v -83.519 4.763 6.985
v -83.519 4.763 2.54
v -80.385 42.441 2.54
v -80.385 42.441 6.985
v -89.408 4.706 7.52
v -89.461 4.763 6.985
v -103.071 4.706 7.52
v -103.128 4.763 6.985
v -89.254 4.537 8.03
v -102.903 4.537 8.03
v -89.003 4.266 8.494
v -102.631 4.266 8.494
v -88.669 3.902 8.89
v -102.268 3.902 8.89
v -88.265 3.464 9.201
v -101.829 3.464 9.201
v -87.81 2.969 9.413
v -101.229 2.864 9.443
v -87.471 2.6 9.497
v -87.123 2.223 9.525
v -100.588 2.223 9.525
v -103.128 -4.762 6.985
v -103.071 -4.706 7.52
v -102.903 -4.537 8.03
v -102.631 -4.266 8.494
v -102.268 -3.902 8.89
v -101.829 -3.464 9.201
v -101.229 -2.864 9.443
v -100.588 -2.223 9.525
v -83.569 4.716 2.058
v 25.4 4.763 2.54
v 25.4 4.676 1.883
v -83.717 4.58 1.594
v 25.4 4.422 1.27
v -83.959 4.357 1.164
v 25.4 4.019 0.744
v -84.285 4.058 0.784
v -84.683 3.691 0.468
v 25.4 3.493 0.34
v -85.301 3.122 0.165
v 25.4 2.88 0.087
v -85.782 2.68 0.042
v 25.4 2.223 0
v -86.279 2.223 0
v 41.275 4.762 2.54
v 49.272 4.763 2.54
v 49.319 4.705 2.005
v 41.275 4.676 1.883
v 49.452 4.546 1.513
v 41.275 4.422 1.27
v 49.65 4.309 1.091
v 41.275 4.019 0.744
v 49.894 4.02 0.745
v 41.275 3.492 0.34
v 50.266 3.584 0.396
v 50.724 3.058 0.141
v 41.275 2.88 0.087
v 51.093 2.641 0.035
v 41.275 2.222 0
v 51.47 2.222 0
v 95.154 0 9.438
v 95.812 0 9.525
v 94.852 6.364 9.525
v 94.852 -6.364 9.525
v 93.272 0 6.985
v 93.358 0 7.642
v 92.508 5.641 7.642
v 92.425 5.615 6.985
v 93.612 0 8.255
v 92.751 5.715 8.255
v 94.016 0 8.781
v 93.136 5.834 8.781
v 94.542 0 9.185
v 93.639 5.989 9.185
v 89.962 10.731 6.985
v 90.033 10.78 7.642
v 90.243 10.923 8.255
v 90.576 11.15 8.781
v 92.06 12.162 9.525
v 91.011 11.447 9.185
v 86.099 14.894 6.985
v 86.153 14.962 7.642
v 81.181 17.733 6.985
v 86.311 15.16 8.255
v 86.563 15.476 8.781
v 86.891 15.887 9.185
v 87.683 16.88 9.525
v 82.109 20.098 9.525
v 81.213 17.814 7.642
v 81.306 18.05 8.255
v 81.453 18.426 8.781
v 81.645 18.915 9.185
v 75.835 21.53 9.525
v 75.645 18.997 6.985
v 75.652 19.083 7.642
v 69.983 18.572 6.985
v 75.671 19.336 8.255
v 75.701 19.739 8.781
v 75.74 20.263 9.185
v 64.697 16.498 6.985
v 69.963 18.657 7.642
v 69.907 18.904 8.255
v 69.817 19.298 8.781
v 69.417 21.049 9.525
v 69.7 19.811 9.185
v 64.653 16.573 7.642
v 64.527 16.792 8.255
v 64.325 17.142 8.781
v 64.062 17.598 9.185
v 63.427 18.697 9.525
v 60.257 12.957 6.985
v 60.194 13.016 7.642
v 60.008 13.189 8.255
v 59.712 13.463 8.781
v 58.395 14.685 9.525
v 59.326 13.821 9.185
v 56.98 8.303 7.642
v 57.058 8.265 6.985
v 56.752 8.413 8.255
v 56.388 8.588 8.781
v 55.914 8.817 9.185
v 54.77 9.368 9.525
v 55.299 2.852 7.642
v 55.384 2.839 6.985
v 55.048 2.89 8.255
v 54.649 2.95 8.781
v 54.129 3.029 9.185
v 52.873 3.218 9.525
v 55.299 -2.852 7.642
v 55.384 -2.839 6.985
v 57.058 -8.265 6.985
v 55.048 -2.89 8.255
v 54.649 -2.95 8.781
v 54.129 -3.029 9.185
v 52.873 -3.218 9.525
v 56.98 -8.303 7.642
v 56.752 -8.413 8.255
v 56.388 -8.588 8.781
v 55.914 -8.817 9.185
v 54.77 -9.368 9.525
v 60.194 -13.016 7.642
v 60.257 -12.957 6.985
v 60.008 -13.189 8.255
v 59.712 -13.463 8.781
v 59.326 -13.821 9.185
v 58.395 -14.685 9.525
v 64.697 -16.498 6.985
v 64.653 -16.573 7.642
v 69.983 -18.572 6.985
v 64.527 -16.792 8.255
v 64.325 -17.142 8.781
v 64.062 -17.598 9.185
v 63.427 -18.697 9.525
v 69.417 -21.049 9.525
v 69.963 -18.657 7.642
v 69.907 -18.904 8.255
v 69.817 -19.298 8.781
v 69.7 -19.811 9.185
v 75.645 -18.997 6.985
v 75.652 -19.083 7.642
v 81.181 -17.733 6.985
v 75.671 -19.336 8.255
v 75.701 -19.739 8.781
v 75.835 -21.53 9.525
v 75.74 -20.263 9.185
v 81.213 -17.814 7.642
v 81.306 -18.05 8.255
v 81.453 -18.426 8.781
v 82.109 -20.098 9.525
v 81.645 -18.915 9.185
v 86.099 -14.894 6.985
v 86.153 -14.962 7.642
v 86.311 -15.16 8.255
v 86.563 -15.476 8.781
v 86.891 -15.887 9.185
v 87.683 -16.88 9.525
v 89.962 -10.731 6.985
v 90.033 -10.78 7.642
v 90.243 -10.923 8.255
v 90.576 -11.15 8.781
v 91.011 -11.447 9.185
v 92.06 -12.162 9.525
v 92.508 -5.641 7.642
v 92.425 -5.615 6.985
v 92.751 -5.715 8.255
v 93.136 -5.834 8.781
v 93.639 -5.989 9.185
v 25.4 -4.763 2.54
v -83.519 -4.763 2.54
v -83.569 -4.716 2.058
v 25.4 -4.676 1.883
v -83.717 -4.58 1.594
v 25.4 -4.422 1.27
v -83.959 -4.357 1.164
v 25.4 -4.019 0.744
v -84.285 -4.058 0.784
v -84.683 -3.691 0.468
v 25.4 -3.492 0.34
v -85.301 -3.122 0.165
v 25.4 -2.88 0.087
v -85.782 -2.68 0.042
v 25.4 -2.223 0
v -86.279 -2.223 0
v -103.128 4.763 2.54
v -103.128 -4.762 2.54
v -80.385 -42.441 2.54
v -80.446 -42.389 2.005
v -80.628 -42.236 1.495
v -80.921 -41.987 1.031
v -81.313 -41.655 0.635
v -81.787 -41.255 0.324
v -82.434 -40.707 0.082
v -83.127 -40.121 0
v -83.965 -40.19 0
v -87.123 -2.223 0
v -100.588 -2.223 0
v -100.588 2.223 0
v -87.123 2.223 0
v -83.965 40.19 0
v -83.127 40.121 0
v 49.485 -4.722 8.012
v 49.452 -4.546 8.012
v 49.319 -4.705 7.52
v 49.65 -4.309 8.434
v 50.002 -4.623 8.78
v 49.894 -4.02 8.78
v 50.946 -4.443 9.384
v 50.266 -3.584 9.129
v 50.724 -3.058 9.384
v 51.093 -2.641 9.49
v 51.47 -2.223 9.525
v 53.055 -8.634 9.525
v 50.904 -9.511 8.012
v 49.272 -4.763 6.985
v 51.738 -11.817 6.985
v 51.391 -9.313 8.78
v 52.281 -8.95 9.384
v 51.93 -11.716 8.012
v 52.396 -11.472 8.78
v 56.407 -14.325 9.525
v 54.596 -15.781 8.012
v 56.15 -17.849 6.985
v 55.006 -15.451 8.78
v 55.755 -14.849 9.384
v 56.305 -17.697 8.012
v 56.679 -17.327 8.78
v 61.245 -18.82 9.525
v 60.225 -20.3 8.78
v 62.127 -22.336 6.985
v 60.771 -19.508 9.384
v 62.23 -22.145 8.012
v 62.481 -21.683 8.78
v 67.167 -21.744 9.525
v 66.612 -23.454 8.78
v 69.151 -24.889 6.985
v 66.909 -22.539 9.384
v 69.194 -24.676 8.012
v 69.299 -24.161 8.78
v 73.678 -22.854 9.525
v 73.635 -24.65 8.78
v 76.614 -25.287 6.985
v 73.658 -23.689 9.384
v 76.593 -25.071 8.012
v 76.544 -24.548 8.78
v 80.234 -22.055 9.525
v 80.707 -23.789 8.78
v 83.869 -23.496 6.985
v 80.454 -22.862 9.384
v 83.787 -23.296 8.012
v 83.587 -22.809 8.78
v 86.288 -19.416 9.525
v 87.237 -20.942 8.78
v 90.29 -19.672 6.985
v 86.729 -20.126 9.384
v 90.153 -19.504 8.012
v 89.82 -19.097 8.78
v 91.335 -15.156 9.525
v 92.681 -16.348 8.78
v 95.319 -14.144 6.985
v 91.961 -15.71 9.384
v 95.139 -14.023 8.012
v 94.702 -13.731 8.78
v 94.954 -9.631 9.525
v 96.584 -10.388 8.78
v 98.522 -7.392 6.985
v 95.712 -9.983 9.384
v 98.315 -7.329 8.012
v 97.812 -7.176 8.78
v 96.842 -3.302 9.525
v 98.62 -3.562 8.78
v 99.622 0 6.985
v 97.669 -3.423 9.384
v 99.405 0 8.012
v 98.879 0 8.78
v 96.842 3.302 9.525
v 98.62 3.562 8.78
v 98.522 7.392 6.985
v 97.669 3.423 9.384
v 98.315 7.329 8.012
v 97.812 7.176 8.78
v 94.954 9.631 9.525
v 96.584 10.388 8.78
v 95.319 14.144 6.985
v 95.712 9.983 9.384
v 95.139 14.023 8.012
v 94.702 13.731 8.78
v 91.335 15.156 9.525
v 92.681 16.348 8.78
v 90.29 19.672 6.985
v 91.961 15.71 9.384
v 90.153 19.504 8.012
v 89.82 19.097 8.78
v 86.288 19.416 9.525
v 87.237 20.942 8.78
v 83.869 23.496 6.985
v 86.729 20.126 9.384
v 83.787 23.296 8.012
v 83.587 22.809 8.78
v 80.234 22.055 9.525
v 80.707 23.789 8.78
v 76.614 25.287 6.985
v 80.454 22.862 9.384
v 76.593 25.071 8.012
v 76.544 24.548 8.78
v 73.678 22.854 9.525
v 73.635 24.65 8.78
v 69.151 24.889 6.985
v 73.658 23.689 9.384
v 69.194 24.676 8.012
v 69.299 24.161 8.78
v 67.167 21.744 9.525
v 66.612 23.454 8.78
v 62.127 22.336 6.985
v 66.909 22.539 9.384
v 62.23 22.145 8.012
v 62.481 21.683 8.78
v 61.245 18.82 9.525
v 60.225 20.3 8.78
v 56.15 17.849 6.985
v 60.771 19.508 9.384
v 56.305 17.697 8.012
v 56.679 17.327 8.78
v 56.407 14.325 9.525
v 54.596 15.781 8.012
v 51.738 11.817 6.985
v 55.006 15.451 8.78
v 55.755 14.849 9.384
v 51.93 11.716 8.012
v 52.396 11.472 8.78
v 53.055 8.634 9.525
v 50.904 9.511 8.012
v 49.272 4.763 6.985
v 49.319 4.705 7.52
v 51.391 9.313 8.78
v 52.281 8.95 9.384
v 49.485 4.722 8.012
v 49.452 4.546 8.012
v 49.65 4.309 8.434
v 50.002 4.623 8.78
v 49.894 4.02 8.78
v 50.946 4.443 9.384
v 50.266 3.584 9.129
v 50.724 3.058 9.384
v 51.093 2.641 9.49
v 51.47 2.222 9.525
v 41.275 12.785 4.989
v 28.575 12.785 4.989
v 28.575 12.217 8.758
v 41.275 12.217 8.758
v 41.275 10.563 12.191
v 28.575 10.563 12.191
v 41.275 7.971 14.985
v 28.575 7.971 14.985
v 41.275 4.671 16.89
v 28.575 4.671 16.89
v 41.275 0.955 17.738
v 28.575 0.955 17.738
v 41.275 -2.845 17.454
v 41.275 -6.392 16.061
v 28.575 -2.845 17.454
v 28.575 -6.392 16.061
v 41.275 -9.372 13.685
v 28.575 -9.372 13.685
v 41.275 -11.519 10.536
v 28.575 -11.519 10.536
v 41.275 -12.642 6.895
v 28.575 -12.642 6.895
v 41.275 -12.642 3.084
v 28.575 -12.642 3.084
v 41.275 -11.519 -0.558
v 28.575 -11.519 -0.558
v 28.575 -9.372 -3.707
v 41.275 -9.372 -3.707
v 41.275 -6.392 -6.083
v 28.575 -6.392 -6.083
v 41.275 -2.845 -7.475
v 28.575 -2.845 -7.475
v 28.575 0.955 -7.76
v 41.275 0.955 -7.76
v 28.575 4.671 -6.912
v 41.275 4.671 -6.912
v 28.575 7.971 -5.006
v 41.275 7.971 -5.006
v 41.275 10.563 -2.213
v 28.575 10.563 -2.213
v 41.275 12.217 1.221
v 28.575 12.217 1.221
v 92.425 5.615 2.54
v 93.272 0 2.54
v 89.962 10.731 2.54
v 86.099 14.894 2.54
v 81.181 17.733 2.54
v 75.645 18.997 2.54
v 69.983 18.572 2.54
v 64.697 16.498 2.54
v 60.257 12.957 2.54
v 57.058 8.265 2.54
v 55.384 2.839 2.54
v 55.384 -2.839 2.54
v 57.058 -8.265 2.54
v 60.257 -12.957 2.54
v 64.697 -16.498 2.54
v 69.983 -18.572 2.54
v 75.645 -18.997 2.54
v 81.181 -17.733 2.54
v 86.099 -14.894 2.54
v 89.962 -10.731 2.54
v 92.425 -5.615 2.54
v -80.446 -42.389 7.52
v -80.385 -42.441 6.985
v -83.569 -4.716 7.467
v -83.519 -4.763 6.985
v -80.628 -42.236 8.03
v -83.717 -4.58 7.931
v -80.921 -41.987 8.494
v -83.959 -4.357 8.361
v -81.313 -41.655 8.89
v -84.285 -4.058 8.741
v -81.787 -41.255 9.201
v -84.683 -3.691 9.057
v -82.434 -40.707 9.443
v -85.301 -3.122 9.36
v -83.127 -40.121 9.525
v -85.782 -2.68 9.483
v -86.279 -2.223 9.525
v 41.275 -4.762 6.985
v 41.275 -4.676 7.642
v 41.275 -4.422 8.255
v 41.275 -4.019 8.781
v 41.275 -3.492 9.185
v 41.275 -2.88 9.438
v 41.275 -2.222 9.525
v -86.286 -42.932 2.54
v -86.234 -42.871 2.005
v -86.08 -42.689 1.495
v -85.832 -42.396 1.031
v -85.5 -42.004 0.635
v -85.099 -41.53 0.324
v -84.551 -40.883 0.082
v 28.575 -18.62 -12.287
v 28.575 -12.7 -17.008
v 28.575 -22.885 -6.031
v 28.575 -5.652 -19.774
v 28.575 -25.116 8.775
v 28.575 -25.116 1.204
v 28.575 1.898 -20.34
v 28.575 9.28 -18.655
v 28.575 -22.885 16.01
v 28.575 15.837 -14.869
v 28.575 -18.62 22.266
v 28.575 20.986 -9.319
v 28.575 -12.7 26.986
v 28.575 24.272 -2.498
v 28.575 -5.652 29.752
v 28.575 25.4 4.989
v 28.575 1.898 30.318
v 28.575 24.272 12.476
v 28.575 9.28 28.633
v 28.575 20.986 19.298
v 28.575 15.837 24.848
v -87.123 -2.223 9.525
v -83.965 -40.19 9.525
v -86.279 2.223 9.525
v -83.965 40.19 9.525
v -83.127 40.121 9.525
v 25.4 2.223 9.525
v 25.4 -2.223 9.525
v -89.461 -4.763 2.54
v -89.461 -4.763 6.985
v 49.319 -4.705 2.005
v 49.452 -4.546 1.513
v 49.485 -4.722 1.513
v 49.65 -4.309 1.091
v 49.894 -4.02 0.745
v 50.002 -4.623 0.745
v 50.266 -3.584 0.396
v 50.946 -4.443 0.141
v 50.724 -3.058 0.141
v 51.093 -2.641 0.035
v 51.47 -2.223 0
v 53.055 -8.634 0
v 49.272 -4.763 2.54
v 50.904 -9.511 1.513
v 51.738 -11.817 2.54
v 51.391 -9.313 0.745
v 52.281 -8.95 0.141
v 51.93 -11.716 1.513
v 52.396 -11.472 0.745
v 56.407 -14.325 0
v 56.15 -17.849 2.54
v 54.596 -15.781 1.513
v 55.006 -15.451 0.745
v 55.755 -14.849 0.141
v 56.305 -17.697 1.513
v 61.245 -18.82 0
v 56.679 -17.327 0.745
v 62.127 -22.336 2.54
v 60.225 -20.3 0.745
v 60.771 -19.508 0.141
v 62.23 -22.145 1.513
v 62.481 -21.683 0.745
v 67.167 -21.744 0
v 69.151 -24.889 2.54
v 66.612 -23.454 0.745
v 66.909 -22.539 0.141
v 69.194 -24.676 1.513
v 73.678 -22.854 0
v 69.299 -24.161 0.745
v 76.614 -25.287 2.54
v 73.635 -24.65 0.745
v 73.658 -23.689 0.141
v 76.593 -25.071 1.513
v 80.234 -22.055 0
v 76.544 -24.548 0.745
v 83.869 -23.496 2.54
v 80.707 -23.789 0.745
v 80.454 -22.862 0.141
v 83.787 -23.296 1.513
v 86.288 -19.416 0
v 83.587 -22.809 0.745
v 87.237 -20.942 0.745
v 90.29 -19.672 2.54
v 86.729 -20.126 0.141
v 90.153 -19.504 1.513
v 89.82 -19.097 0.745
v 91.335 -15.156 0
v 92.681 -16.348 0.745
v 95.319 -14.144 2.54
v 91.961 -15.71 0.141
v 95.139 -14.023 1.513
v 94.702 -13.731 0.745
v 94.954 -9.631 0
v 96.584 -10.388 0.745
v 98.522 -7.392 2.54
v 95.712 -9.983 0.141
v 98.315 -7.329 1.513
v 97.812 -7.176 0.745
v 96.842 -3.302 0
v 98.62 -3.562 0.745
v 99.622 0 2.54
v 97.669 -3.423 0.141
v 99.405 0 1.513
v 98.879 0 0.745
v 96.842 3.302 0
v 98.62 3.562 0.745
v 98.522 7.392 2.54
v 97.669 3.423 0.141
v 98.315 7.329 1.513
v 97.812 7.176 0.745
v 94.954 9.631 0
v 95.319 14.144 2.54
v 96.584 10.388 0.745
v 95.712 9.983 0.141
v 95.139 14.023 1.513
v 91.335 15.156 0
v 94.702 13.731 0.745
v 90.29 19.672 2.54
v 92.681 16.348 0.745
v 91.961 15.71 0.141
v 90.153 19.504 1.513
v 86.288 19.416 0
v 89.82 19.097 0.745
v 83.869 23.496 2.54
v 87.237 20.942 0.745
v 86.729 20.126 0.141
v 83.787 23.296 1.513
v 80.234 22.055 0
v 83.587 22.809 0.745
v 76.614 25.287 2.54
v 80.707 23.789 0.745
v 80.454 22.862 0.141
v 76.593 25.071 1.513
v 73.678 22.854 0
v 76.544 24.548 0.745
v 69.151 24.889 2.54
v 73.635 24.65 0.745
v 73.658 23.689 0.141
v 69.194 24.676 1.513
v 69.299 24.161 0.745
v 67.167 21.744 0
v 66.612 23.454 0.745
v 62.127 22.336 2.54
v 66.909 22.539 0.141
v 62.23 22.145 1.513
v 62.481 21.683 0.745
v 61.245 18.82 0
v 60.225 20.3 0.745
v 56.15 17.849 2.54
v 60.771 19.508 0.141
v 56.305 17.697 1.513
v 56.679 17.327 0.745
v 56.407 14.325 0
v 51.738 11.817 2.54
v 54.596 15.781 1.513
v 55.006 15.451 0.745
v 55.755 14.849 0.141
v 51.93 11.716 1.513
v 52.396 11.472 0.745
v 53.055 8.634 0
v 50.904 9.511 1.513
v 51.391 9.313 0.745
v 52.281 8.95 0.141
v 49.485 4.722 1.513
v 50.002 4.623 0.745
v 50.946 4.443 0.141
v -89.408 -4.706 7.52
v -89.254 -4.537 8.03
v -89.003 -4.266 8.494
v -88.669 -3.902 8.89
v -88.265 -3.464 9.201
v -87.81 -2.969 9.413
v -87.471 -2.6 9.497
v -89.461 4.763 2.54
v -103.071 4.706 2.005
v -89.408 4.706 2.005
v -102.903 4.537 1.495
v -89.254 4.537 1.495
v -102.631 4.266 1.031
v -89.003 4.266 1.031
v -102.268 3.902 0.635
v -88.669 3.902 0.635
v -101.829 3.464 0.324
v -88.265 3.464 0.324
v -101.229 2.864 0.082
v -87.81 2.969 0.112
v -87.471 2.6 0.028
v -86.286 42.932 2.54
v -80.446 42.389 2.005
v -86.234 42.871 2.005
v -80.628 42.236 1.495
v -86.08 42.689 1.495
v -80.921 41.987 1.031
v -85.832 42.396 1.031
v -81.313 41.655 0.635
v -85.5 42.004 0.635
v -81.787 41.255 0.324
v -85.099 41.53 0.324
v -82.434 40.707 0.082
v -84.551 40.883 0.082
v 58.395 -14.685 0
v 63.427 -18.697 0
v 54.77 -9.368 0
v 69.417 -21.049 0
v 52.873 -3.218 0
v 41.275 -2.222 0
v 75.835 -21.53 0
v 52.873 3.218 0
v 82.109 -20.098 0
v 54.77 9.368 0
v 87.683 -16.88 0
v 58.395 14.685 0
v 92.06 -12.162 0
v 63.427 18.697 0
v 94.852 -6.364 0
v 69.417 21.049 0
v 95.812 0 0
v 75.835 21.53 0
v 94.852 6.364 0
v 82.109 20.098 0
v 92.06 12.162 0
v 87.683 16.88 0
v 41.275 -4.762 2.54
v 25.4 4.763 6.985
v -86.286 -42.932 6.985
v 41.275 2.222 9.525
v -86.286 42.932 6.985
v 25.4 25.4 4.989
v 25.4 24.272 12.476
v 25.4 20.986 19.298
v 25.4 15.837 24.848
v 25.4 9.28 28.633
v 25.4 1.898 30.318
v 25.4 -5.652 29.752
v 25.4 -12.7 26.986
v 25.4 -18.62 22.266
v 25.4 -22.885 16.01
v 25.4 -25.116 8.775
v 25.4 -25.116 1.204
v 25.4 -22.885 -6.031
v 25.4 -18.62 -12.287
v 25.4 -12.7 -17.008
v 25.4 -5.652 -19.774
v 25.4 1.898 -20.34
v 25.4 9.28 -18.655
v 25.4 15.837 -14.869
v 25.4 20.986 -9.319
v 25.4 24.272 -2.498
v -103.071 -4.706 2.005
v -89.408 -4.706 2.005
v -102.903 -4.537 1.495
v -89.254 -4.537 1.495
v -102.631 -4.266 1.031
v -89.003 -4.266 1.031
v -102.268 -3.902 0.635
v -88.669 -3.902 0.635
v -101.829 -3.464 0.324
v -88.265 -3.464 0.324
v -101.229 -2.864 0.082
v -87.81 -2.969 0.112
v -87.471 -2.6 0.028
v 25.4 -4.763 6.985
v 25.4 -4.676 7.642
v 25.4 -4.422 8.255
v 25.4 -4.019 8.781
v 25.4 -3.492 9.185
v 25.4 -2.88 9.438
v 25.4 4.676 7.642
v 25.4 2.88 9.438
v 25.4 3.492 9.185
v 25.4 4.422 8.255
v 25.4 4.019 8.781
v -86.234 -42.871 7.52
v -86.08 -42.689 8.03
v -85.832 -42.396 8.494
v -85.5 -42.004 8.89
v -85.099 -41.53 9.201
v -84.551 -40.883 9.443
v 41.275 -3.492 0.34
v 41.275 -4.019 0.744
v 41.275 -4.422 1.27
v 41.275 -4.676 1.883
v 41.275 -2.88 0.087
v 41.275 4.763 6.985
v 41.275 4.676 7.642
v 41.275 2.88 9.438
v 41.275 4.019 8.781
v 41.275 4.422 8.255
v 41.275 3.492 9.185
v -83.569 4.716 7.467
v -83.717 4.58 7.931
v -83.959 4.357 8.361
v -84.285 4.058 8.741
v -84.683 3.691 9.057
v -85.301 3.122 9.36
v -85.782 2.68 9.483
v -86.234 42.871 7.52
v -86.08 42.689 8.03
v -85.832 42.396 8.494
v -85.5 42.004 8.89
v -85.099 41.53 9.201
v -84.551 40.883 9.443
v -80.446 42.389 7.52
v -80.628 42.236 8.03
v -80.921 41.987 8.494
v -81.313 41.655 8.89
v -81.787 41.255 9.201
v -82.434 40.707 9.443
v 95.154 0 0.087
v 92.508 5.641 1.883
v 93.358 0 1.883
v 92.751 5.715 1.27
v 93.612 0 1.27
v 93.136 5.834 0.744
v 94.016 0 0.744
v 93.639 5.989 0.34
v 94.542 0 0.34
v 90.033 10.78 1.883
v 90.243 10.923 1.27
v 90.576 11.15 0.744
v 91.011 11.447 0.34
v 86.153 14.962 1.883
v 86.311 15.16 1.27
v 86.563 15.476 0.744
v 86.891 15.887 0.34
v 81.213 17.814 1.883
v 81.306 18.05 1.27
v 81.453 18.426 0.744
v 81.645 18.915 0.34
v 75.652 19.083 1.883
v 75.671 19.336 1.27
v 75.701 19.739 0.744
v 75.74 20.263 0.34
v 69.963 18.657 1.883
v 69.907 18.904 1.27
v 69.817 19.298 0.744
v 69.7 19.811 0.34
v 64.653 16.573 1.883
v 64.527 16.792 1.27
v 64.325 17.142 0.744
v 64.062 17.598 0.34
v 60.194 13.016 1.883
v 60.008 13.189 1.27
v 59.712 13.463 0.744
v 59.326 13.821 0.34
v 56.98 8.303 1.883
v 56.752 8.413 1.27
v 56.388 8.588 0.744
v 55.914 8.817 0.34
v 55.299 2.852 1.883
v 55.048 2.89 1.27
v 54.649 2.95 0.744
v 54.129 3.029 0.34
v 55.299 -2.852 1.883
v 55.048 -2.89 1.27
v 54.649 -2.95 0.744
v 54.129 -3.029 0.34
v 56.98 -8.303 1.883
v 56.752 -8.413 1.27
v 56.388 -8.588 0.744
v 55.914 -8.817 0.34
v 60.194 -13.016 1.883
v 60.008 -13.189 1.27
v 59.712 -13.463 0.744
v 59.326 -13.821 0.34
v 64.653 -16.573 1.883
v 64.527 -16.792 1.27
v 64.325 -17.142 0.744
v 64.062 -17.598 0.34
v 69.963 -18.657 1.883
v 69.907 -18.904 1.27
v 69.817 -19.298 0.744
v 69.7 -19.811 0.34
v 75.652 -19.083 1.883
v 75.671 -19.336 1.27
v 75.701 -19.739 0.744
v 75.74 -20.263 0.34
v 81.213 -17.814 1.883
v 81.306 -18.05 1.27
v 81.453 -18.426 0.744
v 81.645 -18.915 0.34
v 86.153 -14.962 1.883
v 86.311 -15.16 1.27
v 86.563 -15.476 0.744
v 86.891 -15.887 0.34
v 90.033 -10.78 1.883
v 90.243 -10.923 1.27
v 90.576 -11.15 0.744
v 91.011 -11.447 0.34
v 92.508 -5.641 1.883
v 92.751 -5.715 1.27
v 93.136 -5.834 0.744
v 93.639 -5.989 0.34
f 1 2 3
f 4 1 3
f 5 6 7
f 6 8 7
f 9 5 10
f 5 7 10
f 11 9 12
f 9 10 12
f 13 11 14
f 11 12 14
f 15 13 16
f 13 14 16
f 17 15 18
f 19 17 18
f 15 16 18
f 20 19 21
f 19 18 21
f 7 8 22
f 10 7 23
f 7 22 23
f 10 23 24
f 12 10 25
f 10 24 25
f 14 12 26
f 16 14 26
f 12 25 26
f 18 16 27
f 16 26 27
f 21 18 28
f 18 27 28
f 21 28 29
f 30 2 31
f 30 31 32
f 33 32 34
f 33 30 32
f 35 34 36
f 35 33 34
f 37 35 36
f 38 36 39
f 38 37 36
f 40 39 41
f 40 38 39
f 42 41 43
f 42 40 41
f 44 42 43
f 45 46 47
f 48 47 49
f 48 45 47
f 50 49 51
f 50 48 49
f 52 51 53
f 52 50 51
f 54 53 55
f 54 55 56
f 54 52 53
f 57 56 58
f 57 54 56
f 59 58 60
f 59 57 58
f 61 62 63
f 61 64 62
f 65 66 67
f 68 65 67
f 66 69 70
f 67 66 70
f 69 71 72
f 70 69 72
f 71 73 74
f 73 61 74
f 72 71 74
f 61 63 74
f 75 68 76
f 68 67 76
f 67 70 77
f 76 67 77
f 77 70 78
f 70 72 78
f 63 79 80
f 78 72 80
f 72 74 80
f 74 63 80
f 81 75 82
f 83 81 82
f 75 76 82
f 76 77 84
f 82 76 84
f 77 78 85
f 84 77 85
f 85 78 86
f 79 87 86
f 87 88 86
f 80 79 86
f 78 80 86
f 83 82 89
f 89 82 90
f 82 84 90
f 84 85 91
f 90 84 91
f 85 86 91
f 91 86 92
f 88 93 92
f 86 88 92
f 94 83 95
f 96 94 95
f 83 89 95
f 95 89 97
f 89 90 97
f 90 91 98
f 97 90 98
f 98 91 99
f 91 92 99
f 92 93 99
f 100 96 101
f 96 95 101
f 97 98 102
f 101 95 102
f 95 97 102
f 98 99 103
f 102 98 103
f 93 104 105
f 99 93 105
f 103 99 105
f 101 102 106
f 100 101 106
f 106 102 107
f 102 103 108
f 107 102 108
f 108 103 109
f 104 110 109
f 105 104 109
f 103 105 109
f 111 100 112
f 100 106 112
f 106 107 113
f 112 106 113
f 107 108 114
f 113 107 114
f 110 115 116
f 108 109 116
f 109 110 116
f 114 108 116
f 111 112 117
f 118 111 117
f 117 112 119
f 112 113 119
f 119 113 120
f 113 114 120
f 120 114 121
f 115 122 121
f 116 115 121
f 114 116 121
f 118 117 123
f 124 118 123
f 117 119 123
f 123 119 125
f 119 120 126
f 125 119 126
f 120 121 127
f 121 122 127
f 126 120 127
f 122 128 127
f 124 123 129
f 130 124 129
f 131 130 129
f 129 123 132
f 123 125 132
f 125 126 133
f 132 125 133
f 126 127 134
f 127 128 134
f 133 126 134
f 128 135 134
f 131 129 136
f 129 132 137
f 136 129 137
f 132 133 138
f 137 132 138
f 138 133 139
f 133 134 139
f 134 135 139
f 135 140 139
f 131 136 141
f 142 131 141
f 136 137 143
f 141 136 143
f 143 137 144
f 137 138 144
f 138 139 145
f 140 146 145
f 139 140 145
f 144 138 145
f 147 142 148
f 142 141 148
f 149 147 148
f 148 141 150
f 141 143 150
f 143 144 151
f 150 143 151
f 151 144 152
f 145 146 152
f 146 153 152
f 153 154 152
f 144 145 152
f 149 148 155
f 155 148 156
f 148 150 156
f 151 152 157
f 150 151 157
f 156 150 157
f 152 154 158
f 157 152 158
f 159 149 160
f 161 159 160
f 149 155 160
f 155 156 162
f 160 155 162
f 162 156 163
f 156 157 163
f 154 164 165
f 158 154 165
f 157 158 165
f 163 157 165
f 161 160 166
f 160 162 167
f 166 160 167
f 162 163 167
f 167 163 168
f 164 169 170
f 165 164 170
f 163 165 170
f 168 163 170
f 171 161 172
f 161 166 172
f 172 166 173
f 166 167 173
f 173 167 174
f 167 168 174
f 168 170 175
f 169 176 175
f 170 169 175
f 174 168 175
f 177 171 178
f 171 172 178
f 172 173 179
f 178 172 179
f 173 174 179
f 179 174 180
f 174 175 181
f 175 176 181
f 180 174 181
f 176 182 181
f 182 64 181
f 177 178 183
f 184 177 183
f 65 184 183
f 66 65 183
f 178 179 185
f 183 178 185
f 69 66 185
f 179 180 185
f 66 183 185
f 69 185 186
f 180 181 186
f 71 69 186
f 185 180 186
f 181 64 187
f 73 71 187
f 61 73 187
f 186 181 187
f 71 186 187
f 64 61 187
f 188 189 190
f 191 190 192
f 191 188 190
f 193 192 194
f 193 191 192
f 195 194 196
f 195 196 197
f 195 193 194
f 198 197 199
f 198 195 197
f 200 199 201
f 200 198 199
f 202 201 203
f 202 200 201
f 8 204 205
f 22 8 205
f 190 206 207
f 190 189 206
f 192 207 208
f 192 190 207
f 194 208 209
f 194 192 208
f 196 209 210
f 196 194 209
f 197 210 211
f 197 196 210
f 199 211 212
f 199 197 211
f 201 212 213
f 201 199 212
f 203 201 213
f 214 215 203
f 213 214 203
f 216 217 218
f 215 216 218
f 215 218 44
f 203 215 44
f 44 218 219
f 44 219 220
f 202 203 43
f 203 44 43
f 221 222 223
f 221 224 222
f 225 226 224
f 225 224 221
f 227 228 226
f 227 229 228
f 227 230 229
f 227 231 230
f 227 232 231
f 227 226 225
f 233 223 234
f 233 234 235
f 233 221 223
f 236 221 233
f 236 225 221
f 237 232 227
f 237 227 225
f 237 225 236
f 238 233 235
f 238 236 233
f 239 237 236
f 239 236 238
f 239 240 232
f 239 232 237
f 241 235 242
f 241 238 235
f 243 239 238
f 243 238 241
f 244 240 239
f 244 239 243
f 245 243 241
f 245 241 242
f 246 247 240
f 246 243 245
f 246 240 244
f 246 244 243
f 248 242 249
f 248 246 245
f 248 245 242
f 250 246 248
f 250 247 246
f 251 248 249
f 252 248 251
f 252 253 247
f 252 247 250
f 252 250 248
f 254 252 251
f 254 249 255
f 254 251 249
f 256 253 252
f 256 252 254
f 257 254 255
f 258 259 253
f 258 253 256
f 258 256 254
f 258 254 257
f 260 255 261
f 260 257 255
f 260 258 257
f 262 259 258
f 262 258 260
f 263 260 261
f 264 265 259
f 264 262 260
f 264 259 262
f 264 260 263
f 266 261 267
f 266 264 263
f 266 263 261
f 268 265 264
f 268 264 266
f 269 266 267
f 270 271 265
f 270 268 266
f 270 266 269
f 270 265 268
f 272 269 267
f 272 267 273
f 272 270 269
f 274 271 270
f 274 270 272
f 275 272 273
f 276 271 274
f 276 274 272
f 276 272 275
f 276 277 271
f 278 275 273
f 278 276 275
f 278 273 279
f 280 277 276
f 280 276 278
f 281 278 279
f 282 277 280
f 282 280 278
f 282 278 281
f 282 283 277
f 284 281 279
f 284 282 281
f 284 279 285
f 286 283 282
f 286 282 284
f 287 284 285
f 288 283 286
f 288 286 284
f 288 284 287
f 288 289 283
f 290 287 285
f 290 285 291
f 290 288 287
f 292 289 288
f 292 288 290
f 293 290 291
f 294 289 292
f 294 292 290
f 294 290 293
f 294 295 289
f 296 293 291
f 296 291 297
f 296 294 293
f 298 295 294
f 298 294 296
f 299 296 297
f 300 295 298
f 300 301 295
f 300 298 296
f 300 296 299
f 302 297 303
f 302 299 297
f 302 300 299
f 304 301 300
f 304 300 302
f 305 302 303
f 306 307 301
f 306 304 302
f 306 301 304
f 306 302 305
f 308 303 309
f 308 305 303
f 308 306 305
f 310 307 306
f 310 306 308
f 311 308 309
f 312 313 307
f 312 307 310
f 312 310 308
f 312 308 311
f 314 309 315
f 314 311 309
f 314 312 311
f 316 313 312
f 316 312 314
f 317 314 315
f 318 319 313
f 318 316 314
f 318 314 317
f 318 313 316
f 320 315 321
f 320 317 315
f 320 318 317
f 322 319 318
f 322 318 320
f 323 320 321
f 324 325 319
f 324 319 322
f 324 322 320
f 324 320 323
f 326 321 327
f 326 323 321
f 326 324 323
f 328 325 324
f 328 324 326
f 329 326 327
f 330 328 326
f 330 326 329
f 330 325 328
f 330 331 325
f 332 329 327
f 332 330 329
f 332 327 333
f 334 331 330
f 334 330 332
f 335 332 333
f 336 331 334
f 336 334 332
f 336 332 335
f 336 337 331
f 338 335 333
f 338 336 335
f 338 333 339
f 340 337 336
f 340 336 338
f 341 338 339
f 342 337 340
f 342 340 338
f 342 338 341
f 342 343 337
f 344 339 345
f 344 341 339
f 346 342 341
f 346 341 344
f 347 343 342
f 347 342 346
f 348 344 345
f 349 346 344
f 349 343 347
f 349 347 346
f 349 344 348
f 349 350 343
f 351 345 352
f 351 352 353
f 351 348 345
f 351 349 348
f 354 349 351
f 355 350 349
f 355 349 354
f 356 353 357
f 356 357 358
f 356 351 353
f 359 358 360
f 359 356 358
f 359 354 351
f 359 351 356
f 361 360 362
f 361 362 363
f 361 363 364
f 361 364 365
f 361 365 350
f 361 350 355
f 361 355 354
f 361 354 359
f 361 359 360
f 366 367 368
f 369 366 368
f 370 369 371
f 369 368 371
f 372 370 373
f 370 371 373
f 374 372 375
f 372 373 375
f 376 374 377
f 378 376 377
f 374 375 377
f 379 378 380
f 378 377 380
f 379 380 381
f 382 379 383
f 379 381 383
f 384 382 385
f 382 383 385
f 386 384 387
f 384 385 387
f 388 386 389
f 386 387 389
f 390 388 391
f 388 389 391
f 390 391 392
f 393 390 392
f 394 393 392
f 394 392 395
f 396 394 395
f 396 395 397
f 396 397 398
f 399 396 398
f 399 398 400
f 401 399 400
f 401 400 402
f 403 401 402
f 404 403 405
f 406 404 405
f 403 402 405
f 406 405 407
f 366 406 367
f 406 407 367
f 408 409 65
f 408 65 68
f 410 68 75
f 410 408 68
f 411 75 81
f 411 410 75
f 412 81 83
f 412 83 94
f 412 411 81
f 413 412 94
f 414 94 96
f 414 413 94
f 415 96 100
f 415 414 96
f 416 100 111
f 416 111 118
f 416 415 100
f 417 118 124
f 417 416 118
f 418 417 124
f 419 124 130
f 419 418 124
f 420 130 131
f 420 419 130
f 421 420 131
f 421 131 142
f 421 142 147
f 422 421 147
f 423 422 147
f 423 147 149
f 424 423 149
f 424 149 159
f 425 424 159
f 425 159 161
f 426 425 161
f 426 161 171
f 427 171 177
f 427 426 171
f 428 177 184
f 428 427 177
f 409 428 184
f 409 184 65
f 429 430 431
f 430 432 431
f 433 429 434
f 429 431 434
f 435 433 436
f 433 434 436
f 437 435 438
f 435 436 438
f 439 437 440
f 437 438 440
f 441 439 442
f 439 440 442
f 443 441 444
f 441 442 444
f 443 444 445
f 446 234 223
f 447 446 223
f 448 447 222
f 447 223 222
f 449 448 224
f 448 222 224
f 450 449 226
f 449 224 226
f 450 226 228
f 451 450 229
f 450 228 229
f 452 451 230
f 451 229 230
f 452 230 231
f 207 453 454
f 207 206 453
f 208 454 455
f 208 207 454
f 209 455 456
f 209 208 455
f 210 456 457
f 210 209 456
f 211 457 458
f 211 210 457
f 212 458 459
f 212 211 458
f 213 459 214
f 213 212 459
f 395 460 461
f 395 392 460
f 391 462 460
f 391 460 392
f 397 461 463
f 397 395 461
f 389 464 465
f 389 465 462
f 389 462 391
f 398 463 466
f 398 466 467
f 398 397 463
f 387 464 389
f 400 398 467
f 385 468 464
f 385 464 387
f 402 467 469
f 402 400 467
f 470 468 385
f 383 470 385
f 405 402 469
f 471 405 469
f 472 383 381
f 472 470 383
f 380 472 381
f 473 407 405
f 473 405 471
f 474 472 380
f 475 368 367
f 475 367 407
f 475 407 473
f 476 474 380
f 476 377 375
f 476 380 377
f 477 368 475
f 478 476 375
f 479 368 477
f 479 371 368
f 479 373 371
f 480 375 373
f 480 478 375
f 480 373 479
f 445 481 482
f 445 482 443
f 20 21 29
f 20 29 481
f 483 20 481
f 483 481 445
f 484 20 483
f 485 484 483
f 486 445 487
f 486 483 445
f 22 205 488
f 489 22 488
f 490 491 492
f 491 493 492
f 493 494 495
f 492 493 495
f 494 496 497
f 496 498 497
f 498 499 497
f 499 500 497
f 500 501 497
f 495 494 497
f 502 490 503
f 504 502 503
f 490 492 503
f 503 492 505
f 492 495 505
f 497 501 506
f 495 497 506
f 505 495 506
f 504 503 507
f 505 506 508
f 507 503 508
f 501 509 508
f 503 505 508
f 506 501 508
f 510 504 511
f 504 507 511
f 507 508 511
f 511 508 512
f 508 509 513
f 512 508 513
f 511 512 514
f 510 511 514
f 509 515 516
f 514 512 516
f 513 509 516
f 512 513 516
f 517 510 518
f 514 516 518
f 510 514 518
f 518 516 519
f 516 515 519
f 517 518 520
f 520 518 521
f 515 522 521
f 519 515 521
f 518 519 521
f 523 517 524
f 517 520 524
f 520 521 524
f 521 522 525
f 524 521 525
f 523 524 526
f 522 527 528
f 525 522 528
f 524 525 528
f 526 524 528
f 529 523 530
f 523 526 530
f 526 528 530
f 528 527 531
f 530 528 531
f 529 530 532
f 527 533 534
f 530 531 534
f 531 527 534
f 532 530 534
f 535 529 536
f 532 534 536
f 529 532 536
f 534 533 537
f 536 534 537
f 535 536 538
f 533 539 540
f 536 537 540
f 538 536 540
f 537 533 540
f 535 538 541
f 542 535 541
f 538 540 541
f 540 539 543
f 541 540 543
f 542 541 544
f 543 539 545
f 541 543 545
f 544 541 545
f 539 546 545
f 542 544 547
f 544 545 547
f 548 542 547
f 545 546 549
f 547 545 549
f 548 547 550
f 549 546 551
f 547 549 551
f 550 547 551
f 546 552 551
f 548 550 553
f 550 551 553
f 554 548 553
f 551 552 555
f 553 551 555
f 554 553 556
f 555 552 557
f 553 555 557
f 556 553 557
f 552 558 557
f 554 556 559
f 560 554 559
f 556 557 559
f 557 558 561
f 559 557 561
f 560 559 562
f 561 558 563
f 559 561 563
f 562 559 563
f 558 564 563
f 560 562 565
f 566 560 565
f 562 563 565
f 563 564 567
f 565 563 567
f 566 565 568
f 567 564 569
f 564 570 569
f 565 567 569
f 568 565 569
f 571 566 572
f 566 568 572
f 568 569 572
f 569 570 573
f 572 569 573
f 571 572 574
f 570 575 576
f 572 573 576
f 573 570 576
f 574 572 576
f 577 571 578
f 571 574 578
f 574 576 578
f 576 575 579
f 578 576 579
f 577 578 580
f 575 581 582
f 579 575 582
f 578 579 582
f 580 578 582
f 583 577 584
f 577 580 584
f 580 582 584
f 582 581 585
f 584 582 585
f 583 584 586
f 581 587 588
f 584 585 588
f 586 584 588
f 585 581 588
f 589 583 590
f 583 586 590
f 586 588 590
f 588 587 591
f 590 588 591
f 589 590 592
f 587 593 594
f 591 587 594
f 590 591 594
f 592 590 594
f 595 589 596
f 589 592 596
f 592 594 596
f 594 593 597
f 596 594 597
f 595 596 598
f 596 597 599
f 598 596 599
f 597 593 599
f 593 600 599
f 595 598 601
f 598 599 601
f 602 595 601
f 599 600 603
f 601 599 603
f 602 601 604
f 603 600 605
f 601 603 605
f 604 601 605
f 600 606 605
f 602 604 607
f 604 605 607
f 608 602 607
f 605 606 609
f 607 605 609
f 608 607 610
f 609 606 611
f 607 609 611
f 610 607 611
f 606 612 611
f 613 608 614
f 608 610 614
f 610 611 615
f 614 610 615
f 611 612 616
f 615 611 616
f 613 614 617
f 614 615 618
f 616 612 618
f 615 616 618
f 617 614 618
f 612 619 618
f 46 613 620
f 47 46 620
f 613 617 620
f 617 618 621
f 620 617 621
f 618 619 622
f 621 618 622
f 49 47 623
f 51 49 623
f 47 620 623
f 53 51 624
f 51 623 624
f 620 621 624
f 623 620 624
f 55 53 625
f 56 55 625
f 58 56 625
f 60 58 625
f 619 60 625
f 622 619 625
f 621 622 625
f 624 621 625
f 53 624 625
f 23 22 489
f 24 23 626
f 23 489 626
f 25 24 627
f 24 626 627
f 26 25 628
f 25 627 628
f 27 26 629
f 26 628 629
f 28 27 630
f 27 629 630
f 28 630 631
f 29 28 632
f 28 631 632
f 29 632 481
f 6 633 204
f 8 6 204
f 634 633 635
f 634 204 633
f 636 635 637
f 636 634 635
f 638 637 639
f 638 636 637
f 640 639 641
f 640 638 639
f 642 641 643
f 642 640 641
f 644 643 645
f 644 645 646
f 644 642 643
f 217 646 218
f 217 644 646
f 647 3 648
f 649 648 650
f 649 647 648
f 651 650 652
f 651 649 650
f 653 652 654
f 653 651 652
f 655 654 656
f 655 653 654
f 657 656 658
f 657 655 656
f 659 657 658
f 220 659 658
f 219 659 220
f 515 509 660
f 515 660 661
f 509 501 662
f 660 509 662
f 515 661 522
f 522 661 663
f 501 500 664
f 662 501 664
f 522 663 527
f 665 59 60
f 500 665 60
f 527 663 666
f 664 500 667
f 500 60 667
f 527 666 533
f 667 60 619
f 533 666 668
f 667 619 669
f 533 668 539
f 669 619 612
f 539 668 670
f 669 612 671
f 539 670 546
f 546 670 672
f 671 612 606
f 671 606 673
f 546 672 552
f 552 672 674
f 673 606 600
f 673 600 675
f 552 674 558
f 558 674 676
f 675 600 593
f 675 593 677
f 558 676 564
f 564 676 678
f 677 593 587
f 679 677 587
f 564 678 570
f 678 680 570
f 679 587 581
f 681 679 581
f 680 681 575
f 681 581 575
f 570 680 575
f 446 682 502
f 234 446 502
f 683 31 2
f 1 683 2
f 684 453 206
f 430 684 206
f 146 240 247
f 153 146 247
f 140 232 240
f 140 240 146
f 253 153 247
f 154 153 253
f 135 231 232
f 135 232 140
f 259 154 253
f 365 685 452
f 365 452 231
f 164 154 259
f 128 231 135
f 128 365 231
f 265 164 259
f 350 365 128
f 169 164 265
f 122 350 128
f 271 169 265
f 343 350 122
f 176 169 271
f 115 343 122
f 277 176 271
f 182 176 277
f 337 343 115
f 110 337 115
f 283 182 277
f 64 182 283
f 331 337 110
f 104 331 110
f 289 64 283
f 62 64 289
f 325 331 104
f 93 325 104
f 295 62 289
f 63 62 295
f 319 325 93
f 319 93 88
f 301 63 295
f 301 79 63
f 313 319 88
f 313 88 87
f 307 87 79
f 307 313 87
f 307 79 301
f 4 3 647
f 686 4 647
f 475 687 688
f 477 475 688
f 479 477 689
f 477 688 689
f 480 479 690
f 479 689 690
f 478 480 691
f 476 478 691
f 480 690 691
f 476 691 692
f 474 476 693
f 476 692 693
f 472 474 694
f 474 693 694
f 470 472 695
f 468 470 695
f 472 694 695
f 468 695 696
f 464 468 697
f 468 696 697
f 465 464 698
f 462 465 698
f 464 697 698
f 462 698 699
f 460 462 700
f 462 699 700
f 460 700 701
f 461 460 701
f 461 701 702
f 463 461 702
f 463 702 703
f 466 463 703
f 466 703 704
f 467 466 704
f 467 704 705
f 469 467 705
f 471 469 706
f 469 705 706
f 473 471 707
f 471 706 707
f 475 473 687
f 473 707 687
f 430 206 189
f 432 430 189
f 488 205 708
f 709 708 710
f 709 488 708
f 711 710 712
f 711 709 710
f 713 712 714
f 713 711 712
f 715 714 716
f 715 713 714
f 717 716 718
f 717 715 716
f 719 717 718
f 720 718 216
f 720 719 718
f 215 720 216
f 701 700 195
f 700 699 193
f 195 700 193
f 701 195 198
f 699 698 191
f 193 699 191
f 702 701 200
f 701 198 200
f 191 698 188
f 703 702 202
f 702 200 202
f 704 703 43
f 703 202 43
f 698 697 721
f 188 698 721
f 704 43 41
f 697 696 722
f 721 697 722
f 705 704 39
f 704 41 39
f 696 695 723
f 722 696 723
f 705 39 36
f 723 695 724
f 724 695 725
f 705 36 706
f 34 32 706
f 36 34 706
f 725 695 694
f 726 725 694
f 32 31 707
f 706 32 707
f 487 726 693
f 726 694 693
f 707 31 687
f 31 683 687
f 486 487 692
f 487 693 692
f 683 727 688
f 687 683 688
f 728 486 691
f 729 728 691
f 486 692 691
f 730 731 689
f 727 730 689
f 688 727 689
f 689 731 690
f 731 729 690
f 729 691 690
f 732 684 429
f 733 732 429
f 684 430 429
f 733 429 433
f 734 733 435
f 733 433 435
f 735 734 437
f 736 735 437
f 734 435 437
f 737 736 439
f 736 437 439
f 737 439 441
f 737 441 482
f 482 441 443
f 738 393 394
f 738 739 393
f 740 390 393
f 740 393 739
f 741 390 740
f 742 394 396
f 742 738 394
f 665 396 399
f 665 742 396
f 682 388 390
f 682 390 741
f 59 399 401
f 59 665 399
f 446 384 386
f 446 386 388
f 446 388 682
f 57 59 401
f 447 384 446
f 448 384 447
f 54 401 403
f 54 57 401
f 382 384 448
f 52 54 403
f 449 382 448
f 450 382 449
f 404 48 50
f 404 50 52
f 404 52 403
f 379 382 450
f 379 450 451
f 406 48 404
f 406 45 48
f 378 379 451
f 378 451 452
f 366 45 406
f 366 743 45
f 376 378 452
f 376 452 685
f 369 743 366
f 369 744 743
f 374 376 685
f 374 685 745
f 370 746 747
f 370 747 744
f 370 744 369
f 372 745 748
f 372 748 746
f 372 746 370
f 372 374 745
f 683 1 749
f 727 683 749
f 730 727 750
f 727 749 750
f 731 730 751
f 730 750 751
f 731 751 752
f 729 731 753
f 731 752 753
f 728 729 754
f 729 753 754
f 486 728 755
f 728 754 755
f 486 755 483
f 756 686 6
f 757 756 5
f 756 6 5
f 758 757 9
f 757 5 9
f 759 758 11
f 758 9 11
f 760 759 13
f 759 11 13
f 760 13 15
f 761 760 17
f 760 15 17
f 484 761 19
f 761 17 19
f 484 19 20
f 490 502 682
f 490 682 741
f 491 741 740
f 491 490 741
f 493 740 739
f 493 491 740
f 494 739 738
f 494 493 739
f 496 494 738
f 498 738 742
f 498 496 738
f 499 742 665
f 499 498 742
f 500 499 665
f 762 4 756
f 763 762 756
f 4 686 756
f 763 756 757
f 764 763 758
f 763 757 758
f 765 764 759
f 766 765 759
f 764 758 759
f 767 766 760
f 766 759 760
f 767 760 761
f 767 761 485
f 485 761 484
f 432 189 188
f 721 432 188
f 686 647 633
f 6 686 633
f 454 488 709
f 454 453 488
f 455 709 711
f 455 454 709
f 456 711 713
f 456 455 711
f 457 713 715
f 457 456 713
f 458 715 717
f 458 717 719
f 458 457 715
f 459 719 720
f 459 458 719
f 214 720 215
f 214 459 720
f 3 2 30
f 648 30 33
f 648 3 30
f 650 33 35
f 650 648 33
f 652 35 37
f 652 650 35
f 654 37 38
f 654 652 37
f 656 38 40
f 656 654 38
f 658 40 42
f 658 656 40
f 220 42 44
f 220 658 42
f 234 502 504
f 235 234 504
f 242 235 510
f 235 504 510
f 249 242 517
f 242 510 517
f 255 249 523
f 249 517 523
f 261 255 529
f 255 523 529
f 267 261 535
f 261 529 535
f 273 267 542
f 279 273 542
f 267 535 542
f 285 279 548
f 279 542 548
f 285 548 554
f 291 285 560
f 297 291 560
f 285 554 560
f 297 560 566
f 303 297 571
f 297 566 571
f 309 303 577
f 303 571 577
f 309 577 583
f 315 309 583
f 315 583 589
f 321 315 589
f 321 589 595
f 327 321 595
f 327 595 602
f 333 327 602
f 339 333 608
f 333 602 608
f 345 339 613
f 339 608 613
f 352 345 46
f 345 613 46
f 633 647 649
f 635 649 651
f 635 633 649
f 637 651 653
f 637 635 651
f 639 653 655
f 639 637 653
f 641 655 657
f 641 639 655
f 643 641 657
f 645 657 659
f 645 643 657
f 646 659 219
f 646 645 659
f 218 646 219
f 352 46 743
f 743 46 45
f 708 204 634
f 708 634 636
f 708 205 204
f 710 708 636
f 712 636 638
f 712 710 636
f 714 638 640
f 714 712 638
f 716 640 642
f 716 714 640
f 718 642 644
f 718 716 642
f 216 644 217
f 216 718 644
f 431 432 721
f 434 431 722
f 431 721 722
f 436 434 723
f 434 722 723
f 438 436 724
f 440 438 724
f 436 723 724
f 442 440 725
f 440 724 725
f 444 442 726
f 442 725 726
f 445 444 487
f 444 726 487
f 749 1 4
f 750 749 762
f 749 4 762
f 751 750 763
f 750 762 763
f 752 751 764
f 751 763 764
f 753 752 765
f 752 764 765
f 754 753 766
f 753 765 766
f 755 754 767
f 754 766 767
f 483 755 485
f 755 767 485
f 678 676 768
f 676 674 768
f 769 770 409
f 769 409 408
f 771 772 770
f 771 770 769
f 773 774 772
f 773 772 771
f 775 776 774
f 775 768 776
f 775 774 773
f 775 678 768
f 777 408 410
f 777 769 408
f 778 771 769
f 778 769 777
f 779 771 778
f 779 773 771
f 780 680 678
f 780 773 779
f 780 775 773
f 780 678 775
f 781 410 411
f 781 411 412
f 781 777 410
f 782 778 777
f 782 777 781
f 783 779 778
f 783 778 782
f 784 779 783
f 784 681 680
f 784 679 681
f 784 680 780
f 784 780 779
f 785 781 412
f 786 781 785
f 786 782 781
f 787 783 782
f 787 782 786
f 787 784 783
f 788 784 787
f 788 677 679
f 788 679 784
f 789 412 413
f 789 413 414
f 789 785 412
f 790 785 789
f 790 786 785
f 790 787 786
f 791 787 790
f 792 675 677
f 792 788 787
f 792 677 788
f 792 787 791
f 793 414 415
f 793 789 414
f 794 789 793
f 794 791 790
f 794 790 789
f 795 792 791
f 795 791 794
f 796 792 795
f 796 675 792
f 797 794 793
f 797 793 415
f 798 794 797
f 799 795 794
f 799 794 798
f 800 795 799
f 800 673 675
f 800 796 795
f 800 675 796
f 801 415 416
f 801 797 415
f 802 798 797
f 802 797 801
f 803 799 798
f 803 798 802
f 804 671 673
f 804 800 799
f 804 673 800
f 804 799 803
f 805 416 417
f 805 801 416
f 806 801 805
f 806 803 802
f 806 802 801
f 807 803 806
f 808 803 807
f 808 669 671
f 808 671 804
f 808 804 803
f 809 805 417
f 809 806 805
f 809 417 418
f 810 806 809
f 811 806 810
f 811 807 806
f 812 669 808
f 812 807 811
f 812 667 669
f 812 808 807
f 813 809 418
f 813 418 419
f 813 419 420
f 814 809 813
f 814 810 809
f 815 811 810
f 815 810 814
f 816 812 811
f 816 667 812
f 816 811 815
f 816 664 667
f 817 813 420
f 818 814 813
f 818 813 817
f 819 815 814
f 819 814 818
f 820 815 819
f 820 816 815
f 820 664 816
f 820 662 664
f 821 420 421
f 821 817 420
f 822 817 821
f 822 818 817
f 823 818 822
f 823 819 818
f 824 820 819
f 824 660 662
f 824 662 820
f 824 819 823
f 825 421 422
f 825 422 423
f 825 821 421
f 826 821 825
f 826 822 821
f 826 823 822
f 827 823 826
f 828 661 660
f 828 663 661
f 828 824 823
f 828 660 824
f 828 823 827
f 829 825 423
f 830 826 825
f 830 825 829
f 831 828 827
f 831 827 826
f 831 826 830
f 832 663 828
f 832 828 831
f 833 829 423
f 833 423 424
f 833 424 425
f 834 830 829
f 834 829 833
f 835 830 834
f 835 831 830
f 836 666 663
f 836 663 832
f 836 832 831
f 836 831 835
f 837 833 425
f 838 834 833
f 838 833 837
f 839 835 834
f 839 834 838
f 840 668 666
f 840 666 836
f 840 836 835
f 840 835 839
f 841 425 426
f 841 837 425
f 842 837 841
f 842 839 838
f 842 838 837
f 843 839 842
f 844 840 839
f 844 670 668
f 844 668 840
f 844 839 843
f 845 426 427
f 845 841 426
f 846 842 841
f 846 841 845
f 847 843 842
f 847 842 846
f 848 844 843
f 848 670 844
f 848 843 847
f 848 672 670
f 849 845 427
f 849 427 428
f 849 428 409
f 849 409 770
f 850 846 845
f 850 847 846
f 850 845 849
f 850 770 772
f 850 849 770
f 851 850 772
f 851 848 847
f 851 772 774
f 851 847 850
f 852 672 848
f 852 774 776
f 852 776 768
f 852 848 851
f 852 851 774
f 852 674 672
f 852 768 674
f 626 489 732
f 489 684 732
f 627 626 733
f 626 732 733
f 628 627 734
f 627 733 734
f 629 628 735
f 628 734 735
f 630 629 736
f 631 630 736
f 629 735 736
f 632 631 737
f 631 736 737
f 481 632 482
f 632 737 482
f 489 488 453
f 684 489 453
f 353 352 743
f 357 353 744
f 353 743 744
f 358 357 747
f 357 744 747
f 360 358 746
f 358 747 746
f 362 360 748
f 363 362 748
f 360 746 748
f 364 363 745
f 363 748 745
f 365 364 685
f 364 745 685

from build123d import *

# Parameters (mm, degrees)
F0_R     = 19.05
F1_DEPTH = 9.525
F2_R     = 2.54
F4_R     = 25.4
F4_R_2   = 16.26902
F5_DEPTH = 3.175
F6_R     = 12.784879
F7_DEPTH = 12.7


with BuildPart() as f1:
    # F0 (on Top) → F1 (new body)
    with BuildSketch(Plane.XY):
        with BuildLine():
            Line((-83.518586, -4.7625), (49.272146, -4.7625))
            ThreePointArc((49.272146, -4.7625), (99.621666, 0), (49.272146, 4.7625))
            Line((49.272146, 4.7625), (-83.518586, 4.7625))
            Line((-83.518586, 4.7625), (-80.384782, 42.441457))
            Line((-80.384782, 42.441457), (-86.286046, 42.932272))
            Line((-86.286046, 42.932272), (-89.460671, 4.7625))
            Line((-89.460671, 4.7625), (-103.127854, 4.7625))
            Line((-103.127854, 4.7625), (-103.127854, -4.7625))
            Line((-103.127854, -4.7625), (-89.460671, -4.7625))
            Line((-89.460671, -4.7625), (-86.286046, -42.932272))
            Line((-86.286046, -42.932272), (-80.384782, -42.441457))
            Line((-80.384782, -42.441457), (-83.518586, -4.7625))
        make_face()
        with Locations((74.221666, 0)):
            Circle(F0_R, mode=Mode.SUBTRACT)
    extrude(amount=F1_DEPTH)

    # F2
    f2_edges = [f1.edges().sort_by_distance(p)[0] for p in [
        (-17.12322, -4.7625, 9.525),
        (99.621666, 0, 9.525),
        (-17.12322, 4.7625, 9.525),
        (-81.951684, 23.601978, 9.525),
        (-83.335414, 42.686864, 9.525),
        (-87.873358, 23.847386, 9.525),
        (-96.294263, 4.7625, 9.525),
        (-103.127854, 0, 9.525),
        (-96.294263, -4.7625, 9.525),
        (-87.873358, -23.847386, 9.525),
        (-83.335414, -42.686864, 9.525),
        (-81.951684, -23.601978, 9.525),
        (55.171666, 0, 9.525),
        (-17.12322, -4.7625, 0),
        (99.621666, 0, 0),
        (-17.12322, 4.7625, 0),
        (-81.951684, 23.601978, 0),
        (-83.335414, 42.686864, 0),
        (-87.873358, 23.847386, 0),
        (-96.294263, 4.7625, 0),
        (-103.127854, 0, 0),
        (-96.294263, -4.7625, 0),
        (-87.873358, -23.847386, 0),
        (-83.335414, -42.686864, 0),
        (-81.951684, -23.601978, 0),
        (55.171666, 0, 0),
    ]]
    fillet(f2_edges, radius=F2_R)

    # F4 (on offset) → F5 (join)
    with BuildSketch(Plane.YZ.offset(25.4)):
        with Locations((0, 4.989178)):
            Circle(F4_R)
        with Locations((0, 4.989178)):
            Circle(F4_R_2, mode=Mode.SUBTRACT)
        with Locations((0, 4.989178)):
            Circle(F4_R_2)
    extrude(amount=F5_DEPTH)

    # F6 (on face) → F7 (join)
    with BuildSketch(Plane.YZ.offset(28.575)):
        with Locations((0, 4.989178)):
            Circle(F6_R)
        with BuildLine():
            ThreePointArc((-2.2225, 0), (-4.018551, 0.743949), (-4.7625, 2.54))
            Line((-4.7625, 2.54), (-4.7625, 6.985))
            ThreePointArc((-4.7625, 6.985), (-4.018551, 8.781051), (-2.2225, 9.525))
            Line((-2.2225, 9.525), (2.2225, 9.525))
            ThreePointArc((2.2225, 9.525), (4.018551, 8.781051), (4.7625, 6.985))
            Line((4.7625, 6.985), (4.7625, 2.54))
            ThreePointArc((4.7625, 2.54), (4.018551, 0.743949), (2.2225, 0))
            Line((2.2225, 0), (-2.2225, 0))
        make_face(mode=Mode.SUBTRACT)
    extrude(amount=F7_DEPTH)


solid = f1.part
